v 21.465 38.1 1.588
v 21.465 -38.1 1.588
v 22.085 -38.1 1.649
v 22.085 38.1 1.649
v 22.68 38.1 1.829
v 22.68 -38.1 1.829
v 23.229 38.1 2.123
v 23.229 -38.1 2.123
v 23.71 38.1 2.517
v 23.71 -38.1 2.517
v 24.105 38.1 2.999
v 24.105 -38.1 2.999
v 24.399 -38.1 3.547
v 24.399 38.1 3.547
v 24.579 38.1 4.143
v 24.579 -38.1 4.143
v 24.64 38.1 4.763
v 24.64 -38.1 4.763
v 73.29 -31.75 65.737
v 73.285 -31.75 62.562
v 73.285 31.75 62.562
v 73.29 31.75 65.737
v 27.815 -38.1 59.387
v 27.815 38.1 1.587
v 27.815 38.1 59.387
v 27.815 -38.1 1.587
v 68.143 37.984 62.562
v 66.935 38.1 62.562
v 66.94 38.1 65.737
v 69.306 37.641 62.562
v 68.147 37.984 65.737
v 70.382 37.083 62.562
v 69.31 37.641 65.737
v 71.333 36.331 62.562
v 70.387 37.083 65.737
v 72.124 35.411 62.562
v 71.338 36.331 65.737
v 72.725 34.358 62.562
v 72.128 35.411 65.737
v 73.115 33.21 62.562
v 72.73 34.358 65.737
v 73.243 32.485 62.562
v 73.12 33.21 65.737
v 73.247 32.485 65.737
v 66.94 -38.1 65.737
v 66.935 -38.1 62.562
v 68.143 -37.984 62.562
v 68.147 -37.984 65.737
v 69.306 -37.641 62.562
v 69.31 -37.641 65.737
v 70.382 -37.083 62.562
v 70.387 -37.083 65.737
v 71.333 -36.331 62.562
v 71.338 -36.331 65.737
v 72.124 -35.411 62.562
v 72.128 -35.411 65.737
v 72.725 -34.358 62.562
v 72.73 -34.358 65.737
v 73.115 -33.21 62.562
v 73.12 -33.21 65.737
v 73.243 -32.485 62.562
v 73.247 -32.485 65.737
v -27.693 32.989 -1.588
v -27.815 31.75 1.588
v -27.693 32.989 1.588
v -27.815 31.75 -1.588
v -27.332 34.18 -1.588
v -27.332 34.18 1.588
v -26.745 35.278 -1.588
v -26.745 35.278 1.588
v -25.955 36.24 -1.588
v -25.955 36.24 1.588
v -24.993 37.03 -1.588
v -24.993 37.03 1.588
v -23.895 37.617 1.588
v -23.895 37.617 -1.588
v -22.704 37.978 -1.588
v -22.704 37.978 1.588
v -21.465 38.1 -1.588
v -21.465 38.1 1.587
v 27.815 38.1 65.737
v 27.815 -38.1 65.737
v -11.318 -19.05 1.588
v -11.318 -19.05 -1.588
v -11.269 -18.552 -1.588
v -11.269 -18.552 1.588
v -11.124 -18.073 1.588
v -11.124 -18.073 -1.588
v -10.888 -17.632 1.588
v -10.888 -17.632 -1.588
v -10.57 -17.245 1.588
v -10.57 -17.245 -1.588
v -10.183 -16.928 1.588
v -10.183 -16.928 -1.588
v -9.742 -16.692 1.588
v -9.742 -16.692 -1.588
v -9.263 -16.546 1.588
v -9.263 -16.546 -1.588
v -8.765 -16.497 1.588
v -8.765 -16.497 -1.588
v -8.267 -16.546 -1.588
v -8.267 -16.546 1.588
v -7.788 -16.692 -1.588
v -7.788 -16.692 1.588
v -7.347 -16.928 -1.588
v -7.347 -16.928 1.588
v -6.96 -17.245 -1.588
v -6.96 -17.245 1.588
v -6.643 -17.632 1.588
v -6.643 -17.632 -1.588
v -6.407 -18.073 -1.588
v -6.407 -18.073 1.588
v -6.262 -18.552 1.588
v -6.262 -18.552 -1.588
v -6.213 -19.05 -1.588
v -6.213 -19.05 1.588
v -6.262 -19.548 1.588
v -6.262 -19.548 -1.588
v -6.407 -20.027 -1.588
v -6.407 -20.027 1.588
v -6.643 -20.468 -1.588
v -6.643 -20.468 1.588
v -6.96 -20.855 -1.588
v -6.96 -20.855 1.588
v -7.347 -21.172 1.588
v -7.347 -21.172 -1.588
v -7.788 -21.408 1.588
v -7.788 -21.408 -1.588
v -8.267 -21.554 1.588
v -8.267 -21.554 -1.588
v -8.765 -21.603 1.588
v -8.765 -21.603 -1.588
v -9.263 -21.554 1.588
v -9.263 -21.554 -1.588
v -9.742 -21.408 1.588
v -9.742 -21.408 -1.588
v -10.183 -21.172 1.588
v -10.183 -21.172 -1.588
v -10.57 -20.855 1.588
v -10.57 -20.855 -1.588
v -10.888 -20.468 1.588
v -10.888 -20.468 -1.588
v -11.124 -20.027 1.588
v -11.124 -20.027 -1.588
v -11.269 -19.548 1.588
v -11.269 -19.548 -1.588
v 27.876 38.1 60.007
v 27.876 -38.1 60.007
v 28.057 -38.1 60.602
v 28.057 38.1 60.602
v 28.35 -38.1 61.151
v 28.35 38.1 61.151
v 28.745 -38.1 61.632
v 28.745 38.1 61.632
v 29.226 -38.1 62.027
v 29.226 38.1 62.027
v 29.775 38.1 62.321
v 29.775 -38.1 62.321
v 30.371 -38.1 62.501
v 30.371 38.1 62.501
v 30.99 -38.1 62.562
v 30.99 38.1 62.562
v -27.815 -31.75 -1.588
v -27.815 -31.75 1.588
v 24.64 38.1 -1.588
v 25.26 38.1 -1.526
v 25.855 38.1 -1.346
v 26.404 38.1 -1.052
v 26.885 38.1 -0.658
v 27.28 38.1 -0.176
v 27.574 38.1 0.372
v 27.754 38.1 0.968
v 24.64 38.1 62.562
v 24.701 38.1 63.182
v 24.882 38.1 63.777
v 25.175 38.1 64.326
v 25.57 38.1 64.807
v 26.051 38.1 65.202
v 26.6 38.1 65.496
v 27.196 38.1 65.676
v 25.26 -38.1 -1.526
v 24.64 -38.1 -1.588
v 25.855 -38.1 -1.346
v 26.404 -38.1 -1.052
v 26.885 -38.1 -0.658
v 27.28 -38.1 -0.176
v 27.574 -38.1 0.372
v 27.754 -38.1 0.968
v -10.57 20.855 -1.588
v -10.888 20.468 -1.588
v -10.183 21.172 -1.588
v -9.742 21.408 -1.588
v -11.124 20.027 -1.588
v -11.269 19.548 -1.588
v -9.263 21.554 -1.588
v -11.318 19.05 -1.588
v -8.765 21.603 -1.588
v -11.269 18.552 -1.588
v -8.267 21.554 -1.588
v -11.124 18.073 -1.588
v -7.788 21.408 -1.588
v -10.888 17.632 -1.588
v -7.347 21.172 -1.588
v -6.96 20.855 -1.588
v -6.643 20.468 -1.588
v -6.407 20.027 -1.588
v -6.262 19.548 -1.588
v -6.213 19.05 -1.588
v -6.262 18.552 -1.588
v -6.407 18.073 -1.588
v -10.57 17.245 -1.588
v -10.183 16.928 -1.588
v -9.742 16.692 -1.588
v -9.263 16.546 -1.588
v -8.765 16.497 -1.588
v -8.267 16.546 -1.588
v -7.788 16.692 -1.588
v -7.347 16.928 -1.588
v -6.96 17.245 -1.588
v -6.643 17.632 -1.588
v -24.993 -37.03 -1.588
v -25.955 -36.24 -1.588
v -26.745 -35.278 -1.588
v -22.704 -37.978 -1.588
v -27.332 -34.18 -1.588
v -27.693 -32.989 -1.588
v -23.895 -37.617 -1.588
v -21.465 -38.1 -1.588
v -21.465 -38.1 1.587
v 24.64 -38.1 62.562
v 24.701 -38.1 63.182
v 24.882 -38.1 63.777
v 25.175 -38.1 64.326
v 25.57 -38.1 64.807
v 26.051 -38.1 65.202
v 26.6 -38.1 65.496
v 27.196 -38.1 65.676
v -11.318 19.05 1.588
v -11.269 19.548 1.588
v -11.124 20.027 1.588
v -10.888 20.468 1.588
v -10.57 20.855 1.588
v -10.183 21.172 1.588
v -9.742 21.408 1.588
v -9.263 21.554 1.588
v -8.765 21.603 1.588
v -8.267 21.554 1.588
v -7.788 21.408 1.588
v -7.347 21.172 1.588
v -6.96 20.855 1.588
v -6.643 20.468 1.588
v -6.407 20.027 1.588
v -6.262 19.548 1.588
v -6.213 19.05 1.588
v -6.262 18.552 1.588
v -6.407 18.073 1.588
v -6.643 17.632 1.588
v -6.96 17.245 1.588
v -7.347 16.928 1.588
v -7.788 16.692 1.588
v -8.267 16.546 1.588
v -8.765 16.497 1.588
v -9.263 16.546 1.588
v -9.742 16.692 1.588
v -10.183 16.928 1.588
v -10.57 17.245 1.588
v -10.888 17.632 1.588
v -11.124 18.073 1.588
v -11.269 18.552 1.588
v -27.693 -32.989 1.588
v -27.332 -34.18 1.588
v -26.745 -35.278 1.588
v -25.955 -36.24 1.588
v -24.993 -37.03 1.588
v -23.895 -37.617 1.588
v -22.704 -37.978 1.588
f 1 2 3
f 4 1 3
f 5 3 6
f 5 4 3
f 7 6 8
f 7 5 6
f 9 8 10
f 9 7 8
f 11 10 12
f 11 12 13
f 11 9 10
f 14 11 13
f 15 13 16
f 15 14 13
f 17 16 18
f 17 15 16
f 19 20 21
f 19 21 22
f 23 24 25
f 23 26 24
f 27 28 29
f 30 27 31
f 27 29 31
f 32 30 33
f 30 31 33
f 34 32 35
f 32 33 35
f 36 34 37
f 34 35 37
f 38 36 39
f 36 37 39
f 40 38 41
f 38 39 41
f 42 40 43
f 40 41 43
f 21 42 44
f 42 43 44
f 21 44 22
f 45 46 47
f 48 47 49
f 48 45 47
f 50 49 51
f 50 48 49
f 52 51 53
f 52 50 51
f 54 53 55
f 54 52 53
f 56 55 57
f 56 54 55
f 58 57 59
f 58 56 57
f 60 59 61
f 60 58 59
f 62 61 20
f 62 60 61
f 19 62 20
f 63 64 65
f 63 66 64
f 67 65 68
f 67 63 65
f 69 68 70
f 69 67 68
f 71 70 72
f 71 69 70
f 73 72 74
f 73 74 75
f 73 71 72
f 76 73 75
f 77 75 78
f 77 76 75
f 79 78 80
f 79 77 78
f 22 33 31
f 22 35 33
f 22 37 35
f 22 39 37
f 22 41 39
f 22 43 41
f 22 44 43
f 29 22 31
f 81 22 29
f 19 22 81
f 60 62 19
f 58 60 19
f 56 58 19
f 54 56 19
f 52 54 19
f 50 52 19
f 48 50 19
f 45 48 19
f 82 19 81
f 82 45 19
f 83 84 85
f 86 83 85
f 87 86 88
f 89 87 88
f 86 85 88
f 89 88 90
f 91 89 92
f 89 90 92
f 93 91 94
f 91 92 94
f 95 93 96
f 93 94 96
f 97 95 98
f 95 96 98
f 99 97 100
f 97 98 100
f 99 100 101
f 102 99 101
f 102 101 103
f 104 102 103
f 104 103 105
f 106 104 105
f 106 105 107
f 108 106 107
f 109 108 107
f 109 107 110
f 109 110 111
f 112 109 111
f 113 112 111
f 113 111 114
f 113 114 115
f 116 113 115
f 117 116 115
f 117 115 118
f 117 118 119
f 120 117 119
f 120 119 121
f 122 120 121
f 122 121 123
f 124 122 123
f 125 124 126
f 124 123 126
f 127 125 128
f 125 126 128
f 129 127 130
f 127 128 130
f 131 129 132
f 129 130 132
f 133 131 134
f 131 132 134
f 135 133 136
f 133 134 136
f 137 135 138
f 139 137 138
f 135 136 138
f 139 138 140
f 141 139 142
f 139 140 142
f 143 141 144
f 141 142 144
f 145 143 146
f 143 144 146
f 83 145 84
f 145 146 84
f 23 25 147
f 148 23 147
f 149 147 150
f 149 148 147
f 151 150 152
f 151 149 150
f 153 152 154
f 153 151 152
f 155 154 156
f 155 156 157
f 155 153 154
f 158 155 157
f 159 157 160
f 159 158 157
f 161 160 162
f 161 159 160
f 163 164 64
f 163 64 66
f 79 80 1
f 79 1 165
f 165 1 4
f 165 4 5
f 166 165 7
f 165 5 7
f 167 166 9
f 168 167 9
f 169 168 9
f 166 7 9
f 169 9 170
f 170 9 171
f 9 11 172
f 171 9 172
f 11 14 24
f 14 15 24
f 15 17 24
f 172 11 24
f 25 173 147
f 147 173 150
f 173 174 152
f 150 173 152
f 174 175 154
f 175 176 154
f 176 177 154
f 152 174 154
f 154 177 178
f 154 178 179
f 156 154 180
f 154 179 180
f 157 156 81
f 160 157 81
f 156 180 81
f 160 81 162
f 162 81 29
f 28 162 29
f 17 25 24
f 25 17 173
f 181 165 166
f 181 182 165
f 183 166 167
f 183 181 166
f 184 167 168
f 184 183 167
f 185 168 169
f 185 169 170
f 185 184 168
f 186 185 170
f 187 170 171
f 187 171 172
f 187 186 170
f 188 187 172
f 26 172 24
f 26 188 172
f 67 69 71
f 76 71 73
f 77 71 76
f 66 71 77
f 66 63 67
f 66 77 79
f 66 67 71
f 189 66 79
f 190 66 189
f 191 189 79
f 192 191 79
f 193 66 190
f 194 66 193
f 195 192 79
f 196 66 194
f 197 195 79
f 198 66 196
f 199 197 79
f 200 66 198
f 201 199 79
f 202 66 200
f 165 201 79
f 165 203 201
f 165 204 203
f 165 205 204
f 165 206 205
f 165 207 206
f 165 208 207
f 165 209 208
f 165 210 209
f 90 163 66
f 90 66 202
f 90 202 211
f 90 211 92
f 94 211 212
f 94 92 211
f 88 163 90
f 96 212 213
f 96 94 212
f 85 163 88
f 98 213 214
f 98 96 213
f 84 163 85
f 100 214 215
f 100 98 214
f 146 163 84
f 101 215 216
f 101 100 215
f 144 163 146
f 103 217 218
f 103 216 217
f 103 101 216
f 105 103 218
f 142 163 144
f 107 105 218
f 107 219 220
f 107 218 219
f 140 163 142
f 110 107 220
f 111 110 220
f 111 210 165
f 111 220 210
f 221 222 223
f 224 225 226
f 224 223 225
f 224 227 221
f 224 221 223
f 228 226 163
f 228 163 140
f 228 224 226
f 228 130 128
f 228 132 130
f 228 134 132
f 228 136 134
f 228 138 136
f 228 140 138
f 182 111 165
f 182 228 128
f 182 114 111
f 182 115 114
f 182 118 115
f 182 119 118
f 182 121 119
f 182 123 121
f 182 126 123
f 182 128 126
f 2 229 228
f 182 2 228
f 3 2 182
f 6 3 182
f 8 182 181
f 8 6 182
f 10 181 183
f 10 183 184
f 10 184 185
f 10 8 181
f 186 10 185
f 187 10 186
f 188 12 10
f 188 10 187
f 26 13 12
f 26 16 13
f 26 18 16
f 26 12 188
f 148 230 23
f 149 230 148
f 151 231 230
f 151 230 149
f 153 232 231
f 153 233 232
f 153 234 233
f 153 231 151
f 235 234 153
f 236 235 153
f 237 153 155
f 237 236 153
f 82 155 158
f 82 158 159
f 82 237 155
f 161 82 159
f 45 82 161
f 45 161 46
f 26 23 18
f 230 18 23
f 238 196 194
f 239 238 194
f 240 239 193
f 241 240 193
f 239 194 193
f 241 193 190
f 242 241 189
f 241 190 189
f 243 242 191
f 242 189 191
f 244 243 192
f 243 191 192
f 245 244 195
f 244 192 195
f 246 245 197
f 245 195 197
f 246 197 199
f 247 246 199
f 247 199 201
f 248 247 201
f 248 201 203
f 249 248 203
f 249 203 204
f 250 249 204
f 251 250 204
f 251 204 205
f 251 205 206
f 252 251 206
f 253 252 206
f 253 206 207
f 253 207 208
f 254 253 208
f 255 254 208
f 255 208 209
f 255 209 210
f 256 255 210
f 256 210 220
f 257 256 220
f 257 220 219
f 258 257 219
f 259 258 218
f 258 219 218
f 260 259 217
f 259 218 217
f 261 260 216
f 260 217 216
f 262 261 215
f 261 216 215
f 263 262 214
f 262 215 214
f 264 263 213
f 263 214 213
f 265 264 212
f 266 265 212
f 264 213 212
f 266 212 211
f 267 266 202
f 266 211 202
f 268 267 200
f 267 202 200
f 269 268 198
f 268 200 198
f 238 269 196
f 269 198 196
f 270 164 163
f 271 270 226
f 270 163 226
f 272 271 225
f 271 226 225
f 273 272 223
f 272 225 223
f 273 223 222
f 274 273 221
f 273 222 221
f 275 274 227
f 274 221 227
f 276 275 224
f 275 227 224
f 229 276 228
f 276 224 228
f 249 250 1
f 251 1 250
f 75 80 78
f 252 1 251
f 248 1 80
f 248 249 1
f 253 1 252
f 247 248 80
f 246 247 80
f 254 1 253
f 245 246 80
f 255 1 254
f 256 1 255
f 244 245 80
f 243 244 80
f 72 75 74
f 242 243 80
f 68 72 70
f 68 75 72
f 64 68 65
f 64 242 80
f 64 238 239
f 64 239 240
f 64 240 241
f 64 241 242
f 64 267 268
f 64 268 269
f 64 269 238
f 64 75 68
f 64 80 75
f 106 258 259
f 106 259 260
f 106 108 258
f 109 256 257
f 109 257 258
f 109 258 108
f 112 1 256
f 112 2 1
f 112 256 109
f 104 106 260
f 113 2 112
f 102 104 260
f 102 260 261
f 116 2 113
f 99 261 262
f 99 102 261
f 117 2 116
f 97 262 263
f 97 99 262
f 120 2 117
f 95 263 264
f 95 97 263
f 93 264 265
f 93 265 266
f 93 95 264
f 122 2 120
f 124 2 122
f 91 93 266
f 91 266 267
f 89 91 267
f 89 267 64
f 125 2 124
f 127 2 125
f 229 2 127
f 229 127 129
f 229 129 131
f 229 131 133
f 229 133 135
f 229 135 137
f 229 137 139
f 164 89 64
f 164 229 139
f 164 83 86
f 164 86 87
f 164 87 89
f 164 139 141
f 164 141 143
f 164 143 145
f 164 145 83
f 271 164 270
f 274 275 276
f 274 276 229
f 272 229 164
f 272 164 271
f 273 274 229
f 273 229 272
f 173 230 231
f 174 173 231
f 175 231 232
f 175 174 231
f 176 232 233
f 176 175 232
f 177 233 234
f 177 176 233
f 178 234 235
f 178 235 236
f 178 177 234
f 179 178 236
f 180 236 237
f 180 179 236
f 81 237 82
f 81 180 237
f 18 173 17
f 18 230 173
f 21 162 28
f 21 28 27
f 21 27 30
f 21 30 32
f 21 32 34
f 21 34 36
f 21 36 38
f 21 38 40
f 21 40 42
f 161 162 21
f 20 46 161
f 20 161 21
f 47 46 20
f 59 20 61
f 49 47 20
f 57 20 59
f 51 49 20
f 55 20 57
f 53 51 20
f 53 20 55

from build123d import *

# Parameters (mm, degrees)
F1_DEPTH = 38.1
F2_R     = 6.35
F3_R     = 6.35
F5_D     = 5.1054
F6_R     = 3.175
F7_R     = 3.175


with BuildPart() as f1:
    # F0 (on Front) → F1 (new body, symmetric)
    with BuildSketch(Plane.XZ):
        Polygon((-27.8152357787, 1.5875), (-27.8152357787, -1.5875), (27.8152357787, -1.5875), (27.8152357787, 1.5875), (27.8152357787, 62.5623540473), (73.2854913984, 62.5623540473), (73.2899605753, 65.7373509019), (27.8197049557, 65.7373509019), (24.6402357787, 65.7373509019), (24.6402357787, 62.5623540473), (24.6402357787, 9.6064366907), (24.6402357787, 1.5875), align=None)
    extrude(amount=F1_DEPTH, both=True)

    # F2
    f2_edges = [f1.edges().sort_by_distance(p)[0] for p in [
        (-27.815236, -38.1, 0),
    ]]
    fillet(f2_edges, radius=F2_R)

    # F3
    f3_edges = [f1.edges().sort_by_distance(p)[0] for p in [
        (73.287726, 38.1, 64.149852),
        (73.287726, -38.1, 64.149852),
        (-27.815236, 38.1, 0),
    ]]
    fillet(f3_edges, radius=F3_R)

    # F5 (through all)
    with Locations(Plane.XY.offset(1.5875)):
        with Locations((-8.7652357787, 19.05), (-8.7652357787, -19.05)):
            Hole(F5_D / 2)

    # F6
    f6_edges = [f1.edges().sort_by_distance(p)[0] for p in [
        (24.640236, 0, 65.737351),
        (27.815236, 0, -1.5875),
    ]]
    fillet(f6_edges, radius=F6_R)

    # F7
    f7_edges = [f1.edges().sort_by_distance(p)[0] for p in [
        (27.815236, 0, 62.562354),
        (24.640236, 0, 1.5875),
    ]]
    fillet(f7_edges, radius=F7_R)


solid = f1.part
